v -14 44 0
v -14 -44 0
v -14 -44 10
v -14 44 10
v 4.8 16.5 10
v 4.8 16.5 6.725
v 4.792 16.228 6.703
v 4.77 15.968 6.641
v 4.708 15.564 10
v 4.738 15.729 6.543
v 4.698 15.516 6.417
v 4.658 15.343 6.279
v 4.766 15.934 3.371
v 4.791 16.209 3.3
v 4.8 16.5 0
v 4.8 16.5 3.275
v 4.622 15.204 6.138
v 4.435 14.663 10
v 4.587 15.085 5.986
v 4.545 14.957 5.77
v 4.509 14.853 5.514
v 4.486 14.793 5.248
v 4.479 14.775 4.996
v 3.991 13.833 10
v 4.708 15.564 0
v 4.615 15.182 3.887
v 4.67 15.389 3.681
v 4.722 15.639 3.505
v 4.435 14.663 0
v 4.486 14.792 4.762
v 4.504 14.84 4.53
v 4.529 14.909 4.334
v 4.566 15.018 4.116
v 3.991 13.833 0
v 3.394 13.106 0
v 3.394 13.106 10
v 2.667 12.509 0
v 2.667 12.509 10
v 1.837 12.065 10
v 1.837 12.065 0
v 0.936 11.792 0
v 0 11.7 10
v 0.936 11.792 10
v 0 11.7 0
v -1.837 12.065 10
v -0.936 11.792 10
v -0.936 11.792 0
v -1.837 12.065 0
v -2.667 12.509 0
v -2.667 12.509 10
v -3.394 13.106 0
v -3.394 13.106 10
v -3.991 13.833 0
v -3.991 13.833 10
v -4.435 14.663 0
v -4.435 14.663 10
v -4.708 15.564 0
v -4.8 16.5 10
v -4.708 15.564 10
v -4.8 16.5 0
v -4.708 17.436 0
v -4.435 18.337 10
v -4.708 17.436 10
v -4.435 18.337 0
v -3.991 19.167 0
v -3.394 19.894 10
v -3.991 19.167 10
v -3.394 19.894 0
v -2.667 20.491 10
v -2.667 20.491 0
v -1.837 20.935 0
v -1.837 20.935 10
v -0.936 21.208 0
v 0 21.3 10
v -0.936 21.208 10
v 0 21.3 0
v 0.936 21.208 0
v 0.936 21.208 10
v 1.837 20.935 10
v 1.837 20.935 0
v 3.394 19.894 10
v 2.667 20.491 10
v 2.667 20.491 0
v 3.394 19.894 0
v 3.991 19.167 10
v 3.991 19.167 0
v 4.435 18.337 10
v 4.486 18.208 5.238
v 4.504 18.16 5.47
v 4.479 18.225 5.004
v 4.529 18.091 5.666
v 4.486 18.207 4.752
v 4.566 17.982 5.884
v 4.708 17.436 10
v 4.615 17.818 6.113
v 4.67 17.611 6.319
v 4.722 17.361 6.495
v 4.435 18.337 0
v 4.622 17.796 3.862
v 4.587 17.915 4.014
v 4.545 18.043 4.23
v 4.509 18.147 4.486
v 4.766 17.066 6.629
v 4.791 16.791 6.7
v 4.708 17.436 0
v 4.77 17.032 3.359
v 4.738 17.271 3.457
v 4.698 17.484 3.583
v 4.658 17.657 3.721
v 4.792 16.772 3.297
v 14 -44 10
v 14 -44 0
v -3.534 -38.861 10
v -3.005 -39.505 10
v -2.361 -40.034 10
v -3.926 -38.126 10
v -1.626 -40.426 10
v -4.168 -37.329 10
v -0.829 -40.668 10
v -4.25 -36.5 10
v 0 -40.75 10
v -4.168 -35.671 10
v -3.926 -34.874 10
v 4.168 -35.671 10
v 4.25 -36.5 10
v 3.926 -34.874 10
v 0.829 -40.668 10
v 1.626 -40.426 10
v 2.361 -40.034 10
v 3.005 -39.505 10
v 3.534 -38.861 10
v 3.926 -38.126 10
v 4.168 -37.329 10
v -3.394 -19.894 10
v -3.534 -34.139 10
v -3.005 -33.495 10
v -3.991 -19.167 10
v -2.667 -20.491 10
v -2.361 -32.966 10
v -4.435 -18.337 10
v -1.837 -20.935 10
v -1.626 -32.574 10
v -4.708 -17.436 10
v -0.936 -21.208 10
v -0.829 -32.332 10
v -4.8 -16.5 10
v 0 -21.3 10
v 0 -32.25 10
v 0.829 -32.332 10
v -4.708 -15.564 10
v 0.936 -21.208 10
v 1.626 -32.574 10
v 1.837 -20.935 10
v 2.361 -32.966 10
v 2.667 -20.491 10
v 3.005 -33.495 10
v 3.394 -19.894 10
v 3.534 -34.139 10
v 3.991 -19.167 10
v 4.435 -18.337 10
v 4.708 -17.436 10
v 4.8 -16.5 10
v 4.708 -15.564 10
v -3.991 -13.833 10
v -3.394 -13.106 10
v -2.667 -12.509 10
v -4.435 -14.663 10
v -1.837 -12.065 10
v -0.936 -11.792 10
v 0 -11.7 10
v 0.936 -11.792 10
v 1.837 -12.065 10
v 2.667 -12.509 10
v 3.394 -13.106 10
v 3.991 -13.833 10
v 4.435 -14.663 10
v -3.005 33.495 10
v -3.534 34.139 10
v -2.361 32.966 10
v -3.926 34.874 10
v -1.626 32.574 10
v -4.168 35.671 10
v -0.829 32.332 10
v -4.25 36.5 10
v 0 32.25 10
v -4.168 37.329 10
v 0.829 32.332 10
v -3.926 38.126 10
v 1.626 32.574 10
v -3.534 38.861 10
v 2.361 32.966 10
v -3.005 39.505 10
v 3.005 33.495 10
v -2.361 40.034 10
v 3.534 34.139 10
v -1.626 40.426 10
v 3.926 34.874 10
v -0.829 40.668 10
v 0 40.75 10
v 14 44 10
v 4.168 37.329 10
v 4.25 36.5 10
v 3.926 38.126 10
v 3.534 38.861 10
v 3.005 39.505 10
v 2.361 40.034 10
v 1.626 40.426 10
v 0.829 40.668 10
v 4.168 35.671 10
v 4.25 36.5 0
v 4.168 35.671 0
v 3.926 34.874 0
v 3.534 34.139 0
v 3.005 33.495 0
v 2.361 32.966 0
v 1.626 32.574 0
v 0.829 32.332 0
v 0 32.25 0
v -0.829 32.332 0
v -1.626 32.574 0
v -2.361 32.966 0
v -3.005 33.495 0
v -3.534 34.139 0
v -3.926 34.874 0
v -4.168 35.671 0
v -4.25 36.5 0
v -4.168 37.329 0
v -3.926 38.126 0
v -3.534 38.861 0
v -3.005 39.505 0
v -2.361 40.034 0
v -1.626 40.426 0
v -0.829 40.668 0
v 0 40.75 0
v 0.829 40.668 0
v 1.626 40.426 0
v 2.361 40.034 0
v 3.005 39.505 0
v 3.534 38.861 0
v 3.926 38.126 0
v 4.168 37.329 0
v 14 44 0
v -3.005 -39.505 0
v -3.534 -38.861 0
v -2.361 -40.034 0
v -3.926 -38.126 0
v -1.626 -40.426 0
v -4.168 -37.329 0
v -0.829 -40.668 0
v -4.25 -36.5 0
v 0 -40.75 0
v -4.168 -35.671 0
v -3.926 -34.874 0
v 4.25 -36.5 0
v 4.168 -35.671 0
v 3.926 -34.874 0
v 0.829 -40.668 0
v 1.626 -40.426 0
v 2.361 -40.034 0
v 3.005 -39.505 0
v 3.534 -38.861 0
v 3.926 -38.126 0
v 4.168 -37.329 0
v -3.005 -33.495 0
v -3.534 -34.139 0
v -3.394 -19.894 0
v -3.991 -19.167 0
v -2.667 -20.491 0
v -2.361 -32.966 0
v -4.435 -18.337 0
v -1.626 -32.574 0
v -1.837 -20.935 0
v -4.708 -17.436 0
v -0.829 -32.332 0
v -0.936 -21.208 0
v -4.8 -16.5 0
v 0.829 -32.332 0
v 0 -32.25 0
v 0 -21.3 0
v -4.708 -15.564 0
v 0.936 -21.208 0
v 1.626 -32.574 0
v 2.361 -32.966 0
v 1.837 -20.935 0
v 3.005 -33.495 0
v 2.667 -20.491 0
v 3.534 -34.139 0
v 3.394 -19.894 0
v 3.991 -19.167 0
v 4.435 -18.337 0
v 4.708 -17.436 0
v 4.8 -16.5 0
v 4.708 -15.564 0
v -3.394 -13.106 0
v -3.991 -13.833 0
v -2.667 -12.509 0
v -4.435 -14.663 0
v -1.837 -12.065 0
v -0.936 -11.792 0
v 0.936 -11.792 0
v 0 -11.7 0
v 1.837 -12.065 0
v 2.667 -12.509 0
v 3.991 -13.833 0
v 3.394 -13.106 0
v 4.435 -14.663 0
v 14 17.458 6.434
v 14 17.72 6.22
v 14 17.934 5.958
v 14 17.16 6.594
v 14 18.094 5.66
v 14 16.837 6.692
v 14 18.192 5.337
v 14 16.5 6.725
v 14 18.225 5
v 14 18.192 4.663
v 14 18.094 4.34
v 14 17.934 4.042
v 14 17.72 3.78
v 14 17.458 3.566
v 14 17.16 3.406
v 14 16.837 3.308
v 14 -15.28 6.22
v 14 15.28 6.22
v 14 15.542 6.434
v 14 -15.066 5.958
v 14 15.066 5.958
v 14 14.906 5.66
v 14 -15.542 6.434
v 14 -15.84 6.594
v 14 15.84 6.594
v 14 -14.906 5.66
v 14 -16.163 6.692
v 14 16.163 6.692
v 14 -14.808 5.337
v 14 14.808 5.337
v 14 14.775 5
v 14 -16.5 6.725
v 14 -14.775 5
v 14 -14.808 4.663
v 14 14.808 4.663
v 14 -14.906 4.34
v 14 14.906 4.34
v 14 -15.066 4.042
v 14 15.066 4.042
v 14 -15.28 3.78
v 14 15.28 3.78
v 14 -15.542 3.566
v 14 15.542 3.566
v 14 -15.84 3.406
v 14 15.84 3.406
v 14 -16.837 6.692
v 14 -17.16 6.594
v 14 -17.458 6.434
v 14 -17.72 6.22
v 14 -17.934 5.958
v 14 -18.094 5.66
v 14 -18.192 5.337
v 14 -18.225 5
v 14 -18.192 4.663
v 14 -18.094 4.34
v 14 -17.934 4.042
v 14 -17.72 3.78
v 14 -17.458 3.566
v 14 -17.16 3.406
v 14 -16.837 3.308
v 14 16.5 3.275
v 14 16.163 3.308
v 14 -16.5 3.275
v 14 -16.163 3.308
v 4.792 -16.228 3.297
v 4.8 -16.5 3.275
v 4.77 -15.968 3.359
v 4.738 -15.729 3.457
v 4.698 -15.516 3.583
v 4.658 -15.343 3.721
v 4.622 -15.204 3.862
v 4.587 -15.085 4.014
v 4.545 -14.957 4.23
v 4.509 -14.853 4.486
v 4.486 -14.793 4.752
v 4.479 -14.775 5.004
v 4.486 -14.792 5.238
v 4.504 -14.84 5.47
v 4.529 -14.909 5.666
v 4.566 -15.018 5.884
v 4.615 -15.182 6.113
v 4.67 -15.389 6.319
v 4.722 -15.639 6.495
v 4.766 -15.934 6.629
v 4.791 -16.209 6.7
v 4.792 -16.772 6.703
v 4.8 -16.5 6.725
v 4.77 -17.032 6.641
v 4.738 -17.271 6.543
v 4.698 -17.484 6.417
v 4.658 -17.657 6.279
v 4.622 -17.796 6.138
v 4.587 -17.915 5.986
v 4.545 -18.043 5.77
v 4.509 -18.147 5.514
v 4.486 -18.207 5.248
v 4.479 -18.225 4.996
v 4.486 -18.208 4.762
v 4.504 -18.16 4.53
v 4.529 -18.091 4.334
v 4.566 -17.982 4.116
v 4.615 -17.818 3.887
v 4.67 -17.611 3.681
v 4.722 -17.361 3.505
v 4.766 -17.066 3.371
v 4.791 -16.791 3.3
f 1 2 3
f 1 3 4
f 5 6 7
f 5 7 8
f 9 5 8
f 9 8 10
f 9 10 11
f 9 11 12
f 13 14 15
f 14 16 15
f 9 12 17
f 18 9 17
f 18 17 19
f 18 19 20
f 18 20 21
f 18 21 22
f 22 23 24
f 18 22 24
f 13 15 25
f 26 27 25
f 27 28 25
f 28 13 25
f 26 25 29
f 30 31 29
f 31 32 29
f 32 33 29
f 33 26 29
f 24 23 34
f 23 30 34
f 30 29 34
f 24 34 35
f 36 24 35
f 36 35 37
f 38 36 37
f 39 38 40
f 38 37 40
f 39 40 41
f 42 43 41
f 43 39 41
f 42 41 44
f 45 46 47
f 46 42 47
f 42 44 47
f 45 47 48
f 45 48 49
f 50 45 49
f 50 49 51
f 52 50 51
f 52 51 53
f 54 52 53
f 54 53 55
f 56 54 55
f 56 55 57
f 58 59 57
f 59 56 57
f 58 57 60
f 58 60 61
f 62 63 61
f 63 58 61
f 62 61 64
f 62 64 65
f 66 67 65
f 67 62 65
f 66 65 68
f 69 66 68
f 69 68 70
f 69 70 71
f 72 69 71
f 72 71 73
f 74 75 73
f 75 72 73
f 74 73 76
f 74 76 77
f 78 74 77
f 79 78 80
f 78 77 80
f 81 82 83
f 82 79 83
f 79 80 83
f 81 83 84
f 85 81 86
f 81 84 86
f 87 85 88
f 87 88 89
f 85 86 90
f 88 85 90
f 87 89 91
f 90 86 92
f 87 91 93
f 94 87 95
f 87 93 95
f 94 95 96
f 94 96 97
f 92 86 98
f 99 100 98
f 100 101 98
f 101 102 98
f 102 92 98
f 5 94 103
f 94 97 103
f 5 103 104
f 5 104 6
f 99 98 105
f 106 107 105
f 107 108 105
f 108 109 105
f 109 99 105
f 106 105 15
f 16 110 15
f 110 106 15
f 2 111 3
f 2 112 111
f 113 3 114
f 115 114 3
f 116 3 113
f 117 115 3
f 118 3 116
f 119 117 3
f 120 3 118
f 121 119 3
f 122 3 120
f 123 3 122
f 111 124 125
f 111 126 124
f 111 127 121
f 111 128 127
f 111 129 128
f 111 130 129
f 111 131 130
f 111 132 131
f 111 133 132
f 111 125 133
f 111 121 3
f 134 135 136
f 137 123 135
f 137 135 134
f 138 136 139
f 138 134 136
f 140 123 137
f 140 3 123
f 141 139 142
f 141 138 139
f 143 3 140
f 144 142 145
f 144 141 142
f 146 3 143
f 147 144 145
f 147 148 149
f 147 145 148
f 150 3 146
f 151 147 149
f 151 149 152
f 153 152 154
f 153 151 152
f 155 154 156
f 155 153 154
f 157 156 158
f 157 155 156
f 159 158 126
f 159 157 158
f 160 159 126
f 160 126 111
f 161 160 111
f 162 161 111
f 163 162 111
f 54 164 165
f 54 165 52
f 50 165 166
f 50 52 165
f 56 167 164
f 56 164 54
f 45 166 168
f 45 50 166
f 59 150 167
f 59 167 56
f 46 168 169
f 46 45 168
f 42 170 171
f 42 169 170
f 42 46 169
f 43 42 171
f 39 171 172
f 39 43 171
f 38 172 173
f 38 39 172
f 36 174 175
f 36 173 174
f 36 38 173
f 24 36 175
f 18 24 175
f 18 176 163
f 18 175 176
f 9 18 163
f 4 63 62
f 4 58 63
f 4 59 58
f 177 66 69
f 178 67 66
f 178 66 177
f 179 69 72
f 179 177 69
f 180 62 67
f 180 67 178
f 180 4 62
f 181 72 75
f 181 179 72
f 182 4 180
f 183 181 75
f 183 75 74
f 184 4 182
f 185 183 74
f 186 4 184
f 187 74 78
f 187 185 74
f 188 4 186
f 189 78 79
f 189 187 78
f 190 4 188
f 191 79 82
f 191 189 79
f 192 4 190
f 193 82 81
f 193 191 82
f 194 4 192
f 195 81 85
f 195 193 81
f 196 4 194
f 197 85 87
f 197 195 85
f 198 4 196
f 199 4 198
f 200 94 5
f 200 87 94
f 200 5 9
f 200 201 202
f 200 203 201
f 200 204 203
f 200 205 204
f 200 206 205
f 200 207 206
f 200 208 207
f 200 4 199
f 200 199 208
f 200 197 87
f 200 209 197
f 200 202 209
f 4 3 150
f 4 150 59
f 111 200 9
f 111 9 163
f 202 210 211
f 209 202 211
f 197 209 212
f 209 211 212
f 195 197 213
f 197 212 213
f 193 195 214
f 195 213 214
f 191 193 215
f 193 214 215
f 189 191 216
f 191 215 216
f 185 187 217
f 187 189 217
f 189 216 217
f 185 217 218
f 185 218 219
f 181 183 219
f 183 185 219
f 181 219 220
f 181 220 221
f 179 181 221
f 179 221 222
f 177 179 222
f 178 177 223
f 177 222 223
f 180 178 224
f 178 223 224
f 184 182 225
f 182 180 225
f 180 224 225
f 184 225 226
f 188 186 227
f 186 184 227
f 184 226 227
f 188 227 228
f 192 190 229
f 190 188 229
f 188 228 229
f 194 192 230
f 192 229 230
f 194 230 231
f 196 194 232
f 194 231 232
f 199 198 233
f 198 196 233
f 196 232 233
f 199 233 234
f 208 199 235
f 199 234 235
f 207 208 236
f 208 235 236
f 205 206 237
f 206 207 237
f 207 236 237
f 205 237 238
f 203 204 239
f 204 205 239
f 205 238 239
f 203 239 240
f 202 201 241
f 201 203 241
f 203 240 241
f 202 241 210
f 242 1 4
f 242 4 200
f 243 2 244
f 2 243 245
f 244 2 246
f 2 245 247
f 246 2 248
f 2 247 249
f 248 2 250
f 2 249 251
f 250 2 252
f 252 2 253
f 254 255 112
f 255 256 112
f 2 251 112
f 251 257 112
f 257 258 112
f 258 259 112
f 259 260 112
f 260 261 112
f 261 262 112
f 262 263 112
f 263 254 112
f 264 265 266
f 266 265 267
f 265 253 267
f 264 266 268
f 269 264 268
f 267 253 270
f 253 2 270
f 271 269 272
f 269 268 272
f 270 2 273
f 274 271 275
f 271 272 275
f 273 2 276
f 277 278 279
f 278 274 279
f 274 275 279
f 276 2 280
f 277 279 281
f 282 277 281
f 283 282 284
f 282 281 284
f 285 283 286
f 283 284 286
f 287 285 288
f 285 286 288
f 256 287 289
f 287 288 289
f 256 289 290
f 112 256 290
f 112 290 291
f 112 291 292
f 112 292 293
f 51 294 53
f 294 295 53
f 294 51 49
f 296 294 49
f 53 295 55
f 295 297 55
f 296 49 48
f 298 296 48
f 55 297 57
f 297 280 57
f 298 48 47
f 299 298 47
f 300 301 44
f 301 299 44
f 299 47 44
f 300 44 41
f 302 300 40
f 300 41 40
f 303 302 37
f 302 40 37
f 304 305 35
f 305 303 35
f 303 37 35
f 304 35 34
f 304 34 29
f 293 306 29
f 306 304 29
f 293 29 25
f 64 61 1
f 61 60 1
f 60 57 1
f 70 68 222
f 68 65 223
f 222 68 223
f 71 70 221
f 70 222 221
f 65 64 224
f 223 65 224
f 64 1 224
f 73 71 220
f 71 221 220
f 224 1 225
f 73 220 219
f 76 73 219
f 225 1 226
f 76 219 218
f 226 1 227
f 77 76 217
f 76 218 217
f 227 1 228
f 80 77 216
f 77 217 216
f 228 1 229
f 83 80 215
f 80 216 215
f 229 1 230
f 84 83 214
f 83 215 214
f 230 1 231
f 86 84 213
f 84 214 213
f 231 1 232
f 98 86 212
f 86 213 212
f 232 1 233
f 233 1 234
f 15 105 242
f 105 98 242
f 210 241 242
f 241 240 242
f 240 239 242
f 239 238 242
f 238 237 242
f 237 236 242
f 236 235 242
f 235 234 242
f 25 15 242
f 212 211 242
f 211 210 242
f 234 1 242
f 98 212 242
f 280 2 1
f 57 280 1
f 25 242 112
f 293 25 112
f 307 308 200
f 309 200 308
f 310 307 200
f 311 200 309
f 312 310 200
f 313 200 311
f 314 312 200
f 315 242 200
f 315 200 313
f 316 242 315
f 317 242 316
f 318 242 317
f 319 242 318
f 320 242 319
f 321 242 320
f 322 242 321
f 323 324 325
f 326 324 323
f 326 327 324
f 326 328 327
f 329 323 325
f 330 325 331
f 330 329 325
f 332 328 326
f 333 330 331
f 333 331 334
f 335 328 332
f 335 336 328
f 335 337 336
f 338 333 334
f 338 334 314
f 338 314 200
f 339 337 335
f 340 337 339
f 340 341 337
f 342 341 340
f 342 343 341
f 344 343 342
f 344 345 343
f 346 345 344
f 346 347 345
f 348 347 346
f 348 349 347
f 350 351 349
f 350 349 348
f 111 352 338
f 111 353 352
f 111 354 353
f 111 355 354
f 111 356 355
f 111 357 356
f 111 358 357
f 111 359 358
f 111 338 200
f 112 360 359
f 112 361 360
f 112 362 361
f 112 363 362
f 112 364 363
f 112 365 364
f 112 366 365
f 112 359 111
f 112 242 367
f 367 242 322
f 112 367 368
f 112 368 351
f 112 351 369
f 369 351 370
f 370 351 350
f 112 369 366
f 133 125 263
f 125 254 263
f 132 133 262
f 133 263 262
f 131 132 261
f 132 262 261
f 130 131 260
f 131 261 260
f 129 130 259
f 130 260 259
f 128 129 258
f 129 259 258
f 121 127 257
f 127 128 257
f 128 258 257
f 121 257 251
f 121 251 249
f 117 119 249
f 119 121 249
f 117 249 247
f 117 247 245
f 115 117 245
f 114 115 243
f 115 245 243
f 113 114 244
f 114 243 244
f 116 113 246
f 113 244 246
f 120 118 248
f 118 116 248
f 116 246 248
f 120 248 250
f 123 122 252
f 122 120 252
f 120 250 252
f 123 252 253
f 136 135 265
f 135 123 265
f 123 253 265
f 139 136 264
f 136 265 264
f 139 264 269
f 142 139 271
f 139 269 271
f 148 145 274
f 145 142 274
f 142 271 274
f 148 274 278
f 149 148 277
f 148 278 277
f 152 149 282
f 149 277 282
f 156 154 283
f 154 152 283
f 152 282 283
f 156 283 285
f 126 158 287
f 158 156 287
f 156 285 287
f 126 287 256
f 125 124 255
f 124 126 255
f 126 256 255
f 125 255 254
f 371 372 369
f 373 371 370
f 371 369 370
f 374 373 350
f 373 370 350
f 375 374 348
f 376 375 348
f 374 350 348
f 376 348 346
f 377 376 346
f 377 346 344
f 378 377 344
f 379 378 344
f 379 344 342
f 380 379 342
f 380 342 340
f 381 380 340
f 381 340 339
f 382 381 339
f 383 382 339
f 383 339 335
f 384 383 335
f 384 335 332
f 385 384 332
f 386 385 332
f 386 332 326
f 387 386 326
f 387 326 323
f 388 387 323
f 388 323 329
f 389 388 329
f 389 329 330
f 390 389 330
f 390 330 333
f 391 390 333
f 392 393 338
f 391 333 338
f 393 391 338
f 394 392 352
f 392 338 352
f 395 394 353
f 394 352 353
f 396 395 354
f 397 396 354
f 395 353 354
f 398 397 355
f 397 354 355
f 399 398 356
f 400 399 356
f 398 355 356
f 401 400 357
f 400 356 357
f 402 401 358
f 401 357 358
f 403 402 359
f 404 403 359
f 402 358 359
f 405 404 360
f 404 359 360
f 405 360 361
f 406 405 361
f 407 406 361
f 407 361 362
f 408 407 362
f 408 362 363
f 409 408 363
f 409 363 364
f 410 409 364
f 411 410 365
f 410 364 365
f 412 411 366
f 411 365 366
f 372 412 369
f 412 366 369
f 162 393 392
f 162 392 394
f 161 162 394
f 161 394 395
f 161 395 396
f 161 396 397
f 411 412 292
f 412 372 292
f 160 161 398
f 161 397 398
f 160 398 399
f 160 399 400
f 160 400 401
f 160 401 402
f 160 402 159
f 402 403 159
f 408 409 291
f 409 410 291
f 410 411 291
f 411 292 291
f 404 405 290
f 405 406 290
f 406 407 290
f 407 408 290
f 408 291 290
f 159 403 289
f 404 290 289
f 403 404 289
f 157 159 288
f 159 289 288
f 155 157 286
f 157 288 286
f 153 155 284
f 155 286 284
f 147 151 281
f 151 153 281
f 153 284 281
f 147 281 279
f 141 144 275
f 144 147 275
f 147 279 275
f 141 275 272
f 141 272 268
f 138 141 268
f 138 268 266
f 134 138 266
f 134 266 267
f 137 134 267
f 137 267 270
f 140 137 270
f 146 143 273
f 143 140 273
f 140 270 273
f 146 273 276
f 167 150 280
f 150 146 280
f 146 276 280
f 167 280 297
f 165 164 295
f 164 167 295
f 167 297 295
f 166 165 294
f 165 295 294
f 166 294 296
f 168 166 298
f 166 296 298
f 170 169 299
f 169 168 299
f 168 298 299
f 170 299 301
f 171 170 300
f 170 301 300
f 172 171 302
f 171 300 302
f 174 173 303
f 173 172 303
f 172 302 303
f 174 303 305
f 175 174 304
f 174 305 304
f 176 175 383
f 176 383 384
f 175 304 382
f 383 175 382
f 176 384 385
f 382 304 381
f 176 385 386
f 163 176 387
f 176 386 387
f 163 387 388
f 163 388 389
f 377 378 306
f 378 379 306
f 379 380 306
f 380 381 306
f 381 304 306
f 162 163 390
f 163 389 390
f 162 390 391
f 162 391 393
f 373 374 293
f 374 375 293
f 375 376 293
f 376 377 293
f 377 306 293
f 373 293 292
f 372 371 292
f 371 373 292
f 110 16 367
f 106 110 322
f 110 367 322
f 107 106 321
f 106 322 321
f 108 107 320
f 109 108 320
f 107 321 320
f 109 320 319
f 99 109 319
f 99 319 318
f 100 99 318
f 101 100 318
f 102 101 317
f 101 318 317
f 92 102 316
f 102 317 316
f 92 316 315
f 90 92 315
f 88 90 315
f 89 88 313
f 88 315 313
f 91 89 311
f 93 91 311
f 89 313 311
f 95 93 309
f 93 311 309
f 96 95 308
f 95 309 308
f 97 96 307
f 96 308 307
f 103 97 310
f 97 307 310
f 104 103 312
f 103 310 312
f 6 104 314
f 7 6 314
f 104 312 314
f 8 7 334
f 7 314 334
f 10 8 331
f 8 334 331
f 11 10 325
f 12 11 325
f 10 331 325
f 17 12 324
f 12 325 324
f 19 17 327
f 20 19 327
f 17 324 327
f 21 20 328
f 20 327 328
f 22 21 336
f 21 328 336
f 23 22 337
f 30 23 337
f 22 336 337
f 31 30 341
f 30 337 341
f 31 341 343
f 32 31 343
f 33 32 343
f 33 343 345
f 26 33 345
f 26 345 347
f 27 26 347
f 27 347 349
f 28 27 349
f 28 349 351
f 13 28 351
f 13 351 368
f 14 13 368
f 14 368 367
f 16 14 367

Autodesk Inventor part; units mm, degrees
ref_plane "YZ Plane" through (0, 0, 0) normal (1, 0, 0) x (0, 1, 0)
ref_plane "XZ Plane" through (0, 0, 0) normal (0, 1, 0) x (-1, 0, 0)
ref_plane "XY Plane" through (0, 0, 0) normal (0, 0, 1) x (1, 0, 0)
sketch "Sketch1" plane through (0, 0, 0) normal (0, 0, 1) x (1, 0, 0)
  line L0 (-14, 44) -> (14, 44)
  line L1 (14, 44) -> (14, -44)
  line L2 (14, -44) -> (-14, -44)
  line L3 (-14, -44) -> (-14, 44)
  circle A0 centre (0, 16.5) radius 4.8
  circle A1 centre (0, -16.5) radius 4.8
  circle A2 centre (0, 36.5) radius 4.25
  circle A3 centre (0, -36.5) radius 4.25
  point P0 (0, 0)
  dimension "d0" = 28
  dimension "d2" = 9.6
  dimension "d3" = 9.6
  dimension "d8" = 8.5
  dimension "d9" = 8.5
  dimension "d11" = 20
  dimension "d12" = 20
  dimension "d37" = 44
  dimension "d38" = 44
  dimension "d45" = 33
extrude "Extrusion1" add sketch "Sketch1" along normal blind 10
sketch "Sketch2" plane through (14, -44, 0) normal (1, 0, 0) x (0, 0, -1)
  circle A0 centre (-5, 60.5) radius 1.725
  circle A1 centre (-5, 27.5) radius 1.725
  line L0 (-10, 0) -> (-10, 88) projected
  point P0 (0, 44)
  dimension "d23" = 3.45
  dimension "d24" = 3.45
  dimension "d25" = 16.5
  dimension "d26" = 16.5
  dimension "d27" = 5
  dimension "d28" = 5
extrude "Extrusion2" cut sketch "Sketch2" against normal blind 15
properties part number "12112_Proximal Roller Plate_V1" material "Wood (Birch)"
